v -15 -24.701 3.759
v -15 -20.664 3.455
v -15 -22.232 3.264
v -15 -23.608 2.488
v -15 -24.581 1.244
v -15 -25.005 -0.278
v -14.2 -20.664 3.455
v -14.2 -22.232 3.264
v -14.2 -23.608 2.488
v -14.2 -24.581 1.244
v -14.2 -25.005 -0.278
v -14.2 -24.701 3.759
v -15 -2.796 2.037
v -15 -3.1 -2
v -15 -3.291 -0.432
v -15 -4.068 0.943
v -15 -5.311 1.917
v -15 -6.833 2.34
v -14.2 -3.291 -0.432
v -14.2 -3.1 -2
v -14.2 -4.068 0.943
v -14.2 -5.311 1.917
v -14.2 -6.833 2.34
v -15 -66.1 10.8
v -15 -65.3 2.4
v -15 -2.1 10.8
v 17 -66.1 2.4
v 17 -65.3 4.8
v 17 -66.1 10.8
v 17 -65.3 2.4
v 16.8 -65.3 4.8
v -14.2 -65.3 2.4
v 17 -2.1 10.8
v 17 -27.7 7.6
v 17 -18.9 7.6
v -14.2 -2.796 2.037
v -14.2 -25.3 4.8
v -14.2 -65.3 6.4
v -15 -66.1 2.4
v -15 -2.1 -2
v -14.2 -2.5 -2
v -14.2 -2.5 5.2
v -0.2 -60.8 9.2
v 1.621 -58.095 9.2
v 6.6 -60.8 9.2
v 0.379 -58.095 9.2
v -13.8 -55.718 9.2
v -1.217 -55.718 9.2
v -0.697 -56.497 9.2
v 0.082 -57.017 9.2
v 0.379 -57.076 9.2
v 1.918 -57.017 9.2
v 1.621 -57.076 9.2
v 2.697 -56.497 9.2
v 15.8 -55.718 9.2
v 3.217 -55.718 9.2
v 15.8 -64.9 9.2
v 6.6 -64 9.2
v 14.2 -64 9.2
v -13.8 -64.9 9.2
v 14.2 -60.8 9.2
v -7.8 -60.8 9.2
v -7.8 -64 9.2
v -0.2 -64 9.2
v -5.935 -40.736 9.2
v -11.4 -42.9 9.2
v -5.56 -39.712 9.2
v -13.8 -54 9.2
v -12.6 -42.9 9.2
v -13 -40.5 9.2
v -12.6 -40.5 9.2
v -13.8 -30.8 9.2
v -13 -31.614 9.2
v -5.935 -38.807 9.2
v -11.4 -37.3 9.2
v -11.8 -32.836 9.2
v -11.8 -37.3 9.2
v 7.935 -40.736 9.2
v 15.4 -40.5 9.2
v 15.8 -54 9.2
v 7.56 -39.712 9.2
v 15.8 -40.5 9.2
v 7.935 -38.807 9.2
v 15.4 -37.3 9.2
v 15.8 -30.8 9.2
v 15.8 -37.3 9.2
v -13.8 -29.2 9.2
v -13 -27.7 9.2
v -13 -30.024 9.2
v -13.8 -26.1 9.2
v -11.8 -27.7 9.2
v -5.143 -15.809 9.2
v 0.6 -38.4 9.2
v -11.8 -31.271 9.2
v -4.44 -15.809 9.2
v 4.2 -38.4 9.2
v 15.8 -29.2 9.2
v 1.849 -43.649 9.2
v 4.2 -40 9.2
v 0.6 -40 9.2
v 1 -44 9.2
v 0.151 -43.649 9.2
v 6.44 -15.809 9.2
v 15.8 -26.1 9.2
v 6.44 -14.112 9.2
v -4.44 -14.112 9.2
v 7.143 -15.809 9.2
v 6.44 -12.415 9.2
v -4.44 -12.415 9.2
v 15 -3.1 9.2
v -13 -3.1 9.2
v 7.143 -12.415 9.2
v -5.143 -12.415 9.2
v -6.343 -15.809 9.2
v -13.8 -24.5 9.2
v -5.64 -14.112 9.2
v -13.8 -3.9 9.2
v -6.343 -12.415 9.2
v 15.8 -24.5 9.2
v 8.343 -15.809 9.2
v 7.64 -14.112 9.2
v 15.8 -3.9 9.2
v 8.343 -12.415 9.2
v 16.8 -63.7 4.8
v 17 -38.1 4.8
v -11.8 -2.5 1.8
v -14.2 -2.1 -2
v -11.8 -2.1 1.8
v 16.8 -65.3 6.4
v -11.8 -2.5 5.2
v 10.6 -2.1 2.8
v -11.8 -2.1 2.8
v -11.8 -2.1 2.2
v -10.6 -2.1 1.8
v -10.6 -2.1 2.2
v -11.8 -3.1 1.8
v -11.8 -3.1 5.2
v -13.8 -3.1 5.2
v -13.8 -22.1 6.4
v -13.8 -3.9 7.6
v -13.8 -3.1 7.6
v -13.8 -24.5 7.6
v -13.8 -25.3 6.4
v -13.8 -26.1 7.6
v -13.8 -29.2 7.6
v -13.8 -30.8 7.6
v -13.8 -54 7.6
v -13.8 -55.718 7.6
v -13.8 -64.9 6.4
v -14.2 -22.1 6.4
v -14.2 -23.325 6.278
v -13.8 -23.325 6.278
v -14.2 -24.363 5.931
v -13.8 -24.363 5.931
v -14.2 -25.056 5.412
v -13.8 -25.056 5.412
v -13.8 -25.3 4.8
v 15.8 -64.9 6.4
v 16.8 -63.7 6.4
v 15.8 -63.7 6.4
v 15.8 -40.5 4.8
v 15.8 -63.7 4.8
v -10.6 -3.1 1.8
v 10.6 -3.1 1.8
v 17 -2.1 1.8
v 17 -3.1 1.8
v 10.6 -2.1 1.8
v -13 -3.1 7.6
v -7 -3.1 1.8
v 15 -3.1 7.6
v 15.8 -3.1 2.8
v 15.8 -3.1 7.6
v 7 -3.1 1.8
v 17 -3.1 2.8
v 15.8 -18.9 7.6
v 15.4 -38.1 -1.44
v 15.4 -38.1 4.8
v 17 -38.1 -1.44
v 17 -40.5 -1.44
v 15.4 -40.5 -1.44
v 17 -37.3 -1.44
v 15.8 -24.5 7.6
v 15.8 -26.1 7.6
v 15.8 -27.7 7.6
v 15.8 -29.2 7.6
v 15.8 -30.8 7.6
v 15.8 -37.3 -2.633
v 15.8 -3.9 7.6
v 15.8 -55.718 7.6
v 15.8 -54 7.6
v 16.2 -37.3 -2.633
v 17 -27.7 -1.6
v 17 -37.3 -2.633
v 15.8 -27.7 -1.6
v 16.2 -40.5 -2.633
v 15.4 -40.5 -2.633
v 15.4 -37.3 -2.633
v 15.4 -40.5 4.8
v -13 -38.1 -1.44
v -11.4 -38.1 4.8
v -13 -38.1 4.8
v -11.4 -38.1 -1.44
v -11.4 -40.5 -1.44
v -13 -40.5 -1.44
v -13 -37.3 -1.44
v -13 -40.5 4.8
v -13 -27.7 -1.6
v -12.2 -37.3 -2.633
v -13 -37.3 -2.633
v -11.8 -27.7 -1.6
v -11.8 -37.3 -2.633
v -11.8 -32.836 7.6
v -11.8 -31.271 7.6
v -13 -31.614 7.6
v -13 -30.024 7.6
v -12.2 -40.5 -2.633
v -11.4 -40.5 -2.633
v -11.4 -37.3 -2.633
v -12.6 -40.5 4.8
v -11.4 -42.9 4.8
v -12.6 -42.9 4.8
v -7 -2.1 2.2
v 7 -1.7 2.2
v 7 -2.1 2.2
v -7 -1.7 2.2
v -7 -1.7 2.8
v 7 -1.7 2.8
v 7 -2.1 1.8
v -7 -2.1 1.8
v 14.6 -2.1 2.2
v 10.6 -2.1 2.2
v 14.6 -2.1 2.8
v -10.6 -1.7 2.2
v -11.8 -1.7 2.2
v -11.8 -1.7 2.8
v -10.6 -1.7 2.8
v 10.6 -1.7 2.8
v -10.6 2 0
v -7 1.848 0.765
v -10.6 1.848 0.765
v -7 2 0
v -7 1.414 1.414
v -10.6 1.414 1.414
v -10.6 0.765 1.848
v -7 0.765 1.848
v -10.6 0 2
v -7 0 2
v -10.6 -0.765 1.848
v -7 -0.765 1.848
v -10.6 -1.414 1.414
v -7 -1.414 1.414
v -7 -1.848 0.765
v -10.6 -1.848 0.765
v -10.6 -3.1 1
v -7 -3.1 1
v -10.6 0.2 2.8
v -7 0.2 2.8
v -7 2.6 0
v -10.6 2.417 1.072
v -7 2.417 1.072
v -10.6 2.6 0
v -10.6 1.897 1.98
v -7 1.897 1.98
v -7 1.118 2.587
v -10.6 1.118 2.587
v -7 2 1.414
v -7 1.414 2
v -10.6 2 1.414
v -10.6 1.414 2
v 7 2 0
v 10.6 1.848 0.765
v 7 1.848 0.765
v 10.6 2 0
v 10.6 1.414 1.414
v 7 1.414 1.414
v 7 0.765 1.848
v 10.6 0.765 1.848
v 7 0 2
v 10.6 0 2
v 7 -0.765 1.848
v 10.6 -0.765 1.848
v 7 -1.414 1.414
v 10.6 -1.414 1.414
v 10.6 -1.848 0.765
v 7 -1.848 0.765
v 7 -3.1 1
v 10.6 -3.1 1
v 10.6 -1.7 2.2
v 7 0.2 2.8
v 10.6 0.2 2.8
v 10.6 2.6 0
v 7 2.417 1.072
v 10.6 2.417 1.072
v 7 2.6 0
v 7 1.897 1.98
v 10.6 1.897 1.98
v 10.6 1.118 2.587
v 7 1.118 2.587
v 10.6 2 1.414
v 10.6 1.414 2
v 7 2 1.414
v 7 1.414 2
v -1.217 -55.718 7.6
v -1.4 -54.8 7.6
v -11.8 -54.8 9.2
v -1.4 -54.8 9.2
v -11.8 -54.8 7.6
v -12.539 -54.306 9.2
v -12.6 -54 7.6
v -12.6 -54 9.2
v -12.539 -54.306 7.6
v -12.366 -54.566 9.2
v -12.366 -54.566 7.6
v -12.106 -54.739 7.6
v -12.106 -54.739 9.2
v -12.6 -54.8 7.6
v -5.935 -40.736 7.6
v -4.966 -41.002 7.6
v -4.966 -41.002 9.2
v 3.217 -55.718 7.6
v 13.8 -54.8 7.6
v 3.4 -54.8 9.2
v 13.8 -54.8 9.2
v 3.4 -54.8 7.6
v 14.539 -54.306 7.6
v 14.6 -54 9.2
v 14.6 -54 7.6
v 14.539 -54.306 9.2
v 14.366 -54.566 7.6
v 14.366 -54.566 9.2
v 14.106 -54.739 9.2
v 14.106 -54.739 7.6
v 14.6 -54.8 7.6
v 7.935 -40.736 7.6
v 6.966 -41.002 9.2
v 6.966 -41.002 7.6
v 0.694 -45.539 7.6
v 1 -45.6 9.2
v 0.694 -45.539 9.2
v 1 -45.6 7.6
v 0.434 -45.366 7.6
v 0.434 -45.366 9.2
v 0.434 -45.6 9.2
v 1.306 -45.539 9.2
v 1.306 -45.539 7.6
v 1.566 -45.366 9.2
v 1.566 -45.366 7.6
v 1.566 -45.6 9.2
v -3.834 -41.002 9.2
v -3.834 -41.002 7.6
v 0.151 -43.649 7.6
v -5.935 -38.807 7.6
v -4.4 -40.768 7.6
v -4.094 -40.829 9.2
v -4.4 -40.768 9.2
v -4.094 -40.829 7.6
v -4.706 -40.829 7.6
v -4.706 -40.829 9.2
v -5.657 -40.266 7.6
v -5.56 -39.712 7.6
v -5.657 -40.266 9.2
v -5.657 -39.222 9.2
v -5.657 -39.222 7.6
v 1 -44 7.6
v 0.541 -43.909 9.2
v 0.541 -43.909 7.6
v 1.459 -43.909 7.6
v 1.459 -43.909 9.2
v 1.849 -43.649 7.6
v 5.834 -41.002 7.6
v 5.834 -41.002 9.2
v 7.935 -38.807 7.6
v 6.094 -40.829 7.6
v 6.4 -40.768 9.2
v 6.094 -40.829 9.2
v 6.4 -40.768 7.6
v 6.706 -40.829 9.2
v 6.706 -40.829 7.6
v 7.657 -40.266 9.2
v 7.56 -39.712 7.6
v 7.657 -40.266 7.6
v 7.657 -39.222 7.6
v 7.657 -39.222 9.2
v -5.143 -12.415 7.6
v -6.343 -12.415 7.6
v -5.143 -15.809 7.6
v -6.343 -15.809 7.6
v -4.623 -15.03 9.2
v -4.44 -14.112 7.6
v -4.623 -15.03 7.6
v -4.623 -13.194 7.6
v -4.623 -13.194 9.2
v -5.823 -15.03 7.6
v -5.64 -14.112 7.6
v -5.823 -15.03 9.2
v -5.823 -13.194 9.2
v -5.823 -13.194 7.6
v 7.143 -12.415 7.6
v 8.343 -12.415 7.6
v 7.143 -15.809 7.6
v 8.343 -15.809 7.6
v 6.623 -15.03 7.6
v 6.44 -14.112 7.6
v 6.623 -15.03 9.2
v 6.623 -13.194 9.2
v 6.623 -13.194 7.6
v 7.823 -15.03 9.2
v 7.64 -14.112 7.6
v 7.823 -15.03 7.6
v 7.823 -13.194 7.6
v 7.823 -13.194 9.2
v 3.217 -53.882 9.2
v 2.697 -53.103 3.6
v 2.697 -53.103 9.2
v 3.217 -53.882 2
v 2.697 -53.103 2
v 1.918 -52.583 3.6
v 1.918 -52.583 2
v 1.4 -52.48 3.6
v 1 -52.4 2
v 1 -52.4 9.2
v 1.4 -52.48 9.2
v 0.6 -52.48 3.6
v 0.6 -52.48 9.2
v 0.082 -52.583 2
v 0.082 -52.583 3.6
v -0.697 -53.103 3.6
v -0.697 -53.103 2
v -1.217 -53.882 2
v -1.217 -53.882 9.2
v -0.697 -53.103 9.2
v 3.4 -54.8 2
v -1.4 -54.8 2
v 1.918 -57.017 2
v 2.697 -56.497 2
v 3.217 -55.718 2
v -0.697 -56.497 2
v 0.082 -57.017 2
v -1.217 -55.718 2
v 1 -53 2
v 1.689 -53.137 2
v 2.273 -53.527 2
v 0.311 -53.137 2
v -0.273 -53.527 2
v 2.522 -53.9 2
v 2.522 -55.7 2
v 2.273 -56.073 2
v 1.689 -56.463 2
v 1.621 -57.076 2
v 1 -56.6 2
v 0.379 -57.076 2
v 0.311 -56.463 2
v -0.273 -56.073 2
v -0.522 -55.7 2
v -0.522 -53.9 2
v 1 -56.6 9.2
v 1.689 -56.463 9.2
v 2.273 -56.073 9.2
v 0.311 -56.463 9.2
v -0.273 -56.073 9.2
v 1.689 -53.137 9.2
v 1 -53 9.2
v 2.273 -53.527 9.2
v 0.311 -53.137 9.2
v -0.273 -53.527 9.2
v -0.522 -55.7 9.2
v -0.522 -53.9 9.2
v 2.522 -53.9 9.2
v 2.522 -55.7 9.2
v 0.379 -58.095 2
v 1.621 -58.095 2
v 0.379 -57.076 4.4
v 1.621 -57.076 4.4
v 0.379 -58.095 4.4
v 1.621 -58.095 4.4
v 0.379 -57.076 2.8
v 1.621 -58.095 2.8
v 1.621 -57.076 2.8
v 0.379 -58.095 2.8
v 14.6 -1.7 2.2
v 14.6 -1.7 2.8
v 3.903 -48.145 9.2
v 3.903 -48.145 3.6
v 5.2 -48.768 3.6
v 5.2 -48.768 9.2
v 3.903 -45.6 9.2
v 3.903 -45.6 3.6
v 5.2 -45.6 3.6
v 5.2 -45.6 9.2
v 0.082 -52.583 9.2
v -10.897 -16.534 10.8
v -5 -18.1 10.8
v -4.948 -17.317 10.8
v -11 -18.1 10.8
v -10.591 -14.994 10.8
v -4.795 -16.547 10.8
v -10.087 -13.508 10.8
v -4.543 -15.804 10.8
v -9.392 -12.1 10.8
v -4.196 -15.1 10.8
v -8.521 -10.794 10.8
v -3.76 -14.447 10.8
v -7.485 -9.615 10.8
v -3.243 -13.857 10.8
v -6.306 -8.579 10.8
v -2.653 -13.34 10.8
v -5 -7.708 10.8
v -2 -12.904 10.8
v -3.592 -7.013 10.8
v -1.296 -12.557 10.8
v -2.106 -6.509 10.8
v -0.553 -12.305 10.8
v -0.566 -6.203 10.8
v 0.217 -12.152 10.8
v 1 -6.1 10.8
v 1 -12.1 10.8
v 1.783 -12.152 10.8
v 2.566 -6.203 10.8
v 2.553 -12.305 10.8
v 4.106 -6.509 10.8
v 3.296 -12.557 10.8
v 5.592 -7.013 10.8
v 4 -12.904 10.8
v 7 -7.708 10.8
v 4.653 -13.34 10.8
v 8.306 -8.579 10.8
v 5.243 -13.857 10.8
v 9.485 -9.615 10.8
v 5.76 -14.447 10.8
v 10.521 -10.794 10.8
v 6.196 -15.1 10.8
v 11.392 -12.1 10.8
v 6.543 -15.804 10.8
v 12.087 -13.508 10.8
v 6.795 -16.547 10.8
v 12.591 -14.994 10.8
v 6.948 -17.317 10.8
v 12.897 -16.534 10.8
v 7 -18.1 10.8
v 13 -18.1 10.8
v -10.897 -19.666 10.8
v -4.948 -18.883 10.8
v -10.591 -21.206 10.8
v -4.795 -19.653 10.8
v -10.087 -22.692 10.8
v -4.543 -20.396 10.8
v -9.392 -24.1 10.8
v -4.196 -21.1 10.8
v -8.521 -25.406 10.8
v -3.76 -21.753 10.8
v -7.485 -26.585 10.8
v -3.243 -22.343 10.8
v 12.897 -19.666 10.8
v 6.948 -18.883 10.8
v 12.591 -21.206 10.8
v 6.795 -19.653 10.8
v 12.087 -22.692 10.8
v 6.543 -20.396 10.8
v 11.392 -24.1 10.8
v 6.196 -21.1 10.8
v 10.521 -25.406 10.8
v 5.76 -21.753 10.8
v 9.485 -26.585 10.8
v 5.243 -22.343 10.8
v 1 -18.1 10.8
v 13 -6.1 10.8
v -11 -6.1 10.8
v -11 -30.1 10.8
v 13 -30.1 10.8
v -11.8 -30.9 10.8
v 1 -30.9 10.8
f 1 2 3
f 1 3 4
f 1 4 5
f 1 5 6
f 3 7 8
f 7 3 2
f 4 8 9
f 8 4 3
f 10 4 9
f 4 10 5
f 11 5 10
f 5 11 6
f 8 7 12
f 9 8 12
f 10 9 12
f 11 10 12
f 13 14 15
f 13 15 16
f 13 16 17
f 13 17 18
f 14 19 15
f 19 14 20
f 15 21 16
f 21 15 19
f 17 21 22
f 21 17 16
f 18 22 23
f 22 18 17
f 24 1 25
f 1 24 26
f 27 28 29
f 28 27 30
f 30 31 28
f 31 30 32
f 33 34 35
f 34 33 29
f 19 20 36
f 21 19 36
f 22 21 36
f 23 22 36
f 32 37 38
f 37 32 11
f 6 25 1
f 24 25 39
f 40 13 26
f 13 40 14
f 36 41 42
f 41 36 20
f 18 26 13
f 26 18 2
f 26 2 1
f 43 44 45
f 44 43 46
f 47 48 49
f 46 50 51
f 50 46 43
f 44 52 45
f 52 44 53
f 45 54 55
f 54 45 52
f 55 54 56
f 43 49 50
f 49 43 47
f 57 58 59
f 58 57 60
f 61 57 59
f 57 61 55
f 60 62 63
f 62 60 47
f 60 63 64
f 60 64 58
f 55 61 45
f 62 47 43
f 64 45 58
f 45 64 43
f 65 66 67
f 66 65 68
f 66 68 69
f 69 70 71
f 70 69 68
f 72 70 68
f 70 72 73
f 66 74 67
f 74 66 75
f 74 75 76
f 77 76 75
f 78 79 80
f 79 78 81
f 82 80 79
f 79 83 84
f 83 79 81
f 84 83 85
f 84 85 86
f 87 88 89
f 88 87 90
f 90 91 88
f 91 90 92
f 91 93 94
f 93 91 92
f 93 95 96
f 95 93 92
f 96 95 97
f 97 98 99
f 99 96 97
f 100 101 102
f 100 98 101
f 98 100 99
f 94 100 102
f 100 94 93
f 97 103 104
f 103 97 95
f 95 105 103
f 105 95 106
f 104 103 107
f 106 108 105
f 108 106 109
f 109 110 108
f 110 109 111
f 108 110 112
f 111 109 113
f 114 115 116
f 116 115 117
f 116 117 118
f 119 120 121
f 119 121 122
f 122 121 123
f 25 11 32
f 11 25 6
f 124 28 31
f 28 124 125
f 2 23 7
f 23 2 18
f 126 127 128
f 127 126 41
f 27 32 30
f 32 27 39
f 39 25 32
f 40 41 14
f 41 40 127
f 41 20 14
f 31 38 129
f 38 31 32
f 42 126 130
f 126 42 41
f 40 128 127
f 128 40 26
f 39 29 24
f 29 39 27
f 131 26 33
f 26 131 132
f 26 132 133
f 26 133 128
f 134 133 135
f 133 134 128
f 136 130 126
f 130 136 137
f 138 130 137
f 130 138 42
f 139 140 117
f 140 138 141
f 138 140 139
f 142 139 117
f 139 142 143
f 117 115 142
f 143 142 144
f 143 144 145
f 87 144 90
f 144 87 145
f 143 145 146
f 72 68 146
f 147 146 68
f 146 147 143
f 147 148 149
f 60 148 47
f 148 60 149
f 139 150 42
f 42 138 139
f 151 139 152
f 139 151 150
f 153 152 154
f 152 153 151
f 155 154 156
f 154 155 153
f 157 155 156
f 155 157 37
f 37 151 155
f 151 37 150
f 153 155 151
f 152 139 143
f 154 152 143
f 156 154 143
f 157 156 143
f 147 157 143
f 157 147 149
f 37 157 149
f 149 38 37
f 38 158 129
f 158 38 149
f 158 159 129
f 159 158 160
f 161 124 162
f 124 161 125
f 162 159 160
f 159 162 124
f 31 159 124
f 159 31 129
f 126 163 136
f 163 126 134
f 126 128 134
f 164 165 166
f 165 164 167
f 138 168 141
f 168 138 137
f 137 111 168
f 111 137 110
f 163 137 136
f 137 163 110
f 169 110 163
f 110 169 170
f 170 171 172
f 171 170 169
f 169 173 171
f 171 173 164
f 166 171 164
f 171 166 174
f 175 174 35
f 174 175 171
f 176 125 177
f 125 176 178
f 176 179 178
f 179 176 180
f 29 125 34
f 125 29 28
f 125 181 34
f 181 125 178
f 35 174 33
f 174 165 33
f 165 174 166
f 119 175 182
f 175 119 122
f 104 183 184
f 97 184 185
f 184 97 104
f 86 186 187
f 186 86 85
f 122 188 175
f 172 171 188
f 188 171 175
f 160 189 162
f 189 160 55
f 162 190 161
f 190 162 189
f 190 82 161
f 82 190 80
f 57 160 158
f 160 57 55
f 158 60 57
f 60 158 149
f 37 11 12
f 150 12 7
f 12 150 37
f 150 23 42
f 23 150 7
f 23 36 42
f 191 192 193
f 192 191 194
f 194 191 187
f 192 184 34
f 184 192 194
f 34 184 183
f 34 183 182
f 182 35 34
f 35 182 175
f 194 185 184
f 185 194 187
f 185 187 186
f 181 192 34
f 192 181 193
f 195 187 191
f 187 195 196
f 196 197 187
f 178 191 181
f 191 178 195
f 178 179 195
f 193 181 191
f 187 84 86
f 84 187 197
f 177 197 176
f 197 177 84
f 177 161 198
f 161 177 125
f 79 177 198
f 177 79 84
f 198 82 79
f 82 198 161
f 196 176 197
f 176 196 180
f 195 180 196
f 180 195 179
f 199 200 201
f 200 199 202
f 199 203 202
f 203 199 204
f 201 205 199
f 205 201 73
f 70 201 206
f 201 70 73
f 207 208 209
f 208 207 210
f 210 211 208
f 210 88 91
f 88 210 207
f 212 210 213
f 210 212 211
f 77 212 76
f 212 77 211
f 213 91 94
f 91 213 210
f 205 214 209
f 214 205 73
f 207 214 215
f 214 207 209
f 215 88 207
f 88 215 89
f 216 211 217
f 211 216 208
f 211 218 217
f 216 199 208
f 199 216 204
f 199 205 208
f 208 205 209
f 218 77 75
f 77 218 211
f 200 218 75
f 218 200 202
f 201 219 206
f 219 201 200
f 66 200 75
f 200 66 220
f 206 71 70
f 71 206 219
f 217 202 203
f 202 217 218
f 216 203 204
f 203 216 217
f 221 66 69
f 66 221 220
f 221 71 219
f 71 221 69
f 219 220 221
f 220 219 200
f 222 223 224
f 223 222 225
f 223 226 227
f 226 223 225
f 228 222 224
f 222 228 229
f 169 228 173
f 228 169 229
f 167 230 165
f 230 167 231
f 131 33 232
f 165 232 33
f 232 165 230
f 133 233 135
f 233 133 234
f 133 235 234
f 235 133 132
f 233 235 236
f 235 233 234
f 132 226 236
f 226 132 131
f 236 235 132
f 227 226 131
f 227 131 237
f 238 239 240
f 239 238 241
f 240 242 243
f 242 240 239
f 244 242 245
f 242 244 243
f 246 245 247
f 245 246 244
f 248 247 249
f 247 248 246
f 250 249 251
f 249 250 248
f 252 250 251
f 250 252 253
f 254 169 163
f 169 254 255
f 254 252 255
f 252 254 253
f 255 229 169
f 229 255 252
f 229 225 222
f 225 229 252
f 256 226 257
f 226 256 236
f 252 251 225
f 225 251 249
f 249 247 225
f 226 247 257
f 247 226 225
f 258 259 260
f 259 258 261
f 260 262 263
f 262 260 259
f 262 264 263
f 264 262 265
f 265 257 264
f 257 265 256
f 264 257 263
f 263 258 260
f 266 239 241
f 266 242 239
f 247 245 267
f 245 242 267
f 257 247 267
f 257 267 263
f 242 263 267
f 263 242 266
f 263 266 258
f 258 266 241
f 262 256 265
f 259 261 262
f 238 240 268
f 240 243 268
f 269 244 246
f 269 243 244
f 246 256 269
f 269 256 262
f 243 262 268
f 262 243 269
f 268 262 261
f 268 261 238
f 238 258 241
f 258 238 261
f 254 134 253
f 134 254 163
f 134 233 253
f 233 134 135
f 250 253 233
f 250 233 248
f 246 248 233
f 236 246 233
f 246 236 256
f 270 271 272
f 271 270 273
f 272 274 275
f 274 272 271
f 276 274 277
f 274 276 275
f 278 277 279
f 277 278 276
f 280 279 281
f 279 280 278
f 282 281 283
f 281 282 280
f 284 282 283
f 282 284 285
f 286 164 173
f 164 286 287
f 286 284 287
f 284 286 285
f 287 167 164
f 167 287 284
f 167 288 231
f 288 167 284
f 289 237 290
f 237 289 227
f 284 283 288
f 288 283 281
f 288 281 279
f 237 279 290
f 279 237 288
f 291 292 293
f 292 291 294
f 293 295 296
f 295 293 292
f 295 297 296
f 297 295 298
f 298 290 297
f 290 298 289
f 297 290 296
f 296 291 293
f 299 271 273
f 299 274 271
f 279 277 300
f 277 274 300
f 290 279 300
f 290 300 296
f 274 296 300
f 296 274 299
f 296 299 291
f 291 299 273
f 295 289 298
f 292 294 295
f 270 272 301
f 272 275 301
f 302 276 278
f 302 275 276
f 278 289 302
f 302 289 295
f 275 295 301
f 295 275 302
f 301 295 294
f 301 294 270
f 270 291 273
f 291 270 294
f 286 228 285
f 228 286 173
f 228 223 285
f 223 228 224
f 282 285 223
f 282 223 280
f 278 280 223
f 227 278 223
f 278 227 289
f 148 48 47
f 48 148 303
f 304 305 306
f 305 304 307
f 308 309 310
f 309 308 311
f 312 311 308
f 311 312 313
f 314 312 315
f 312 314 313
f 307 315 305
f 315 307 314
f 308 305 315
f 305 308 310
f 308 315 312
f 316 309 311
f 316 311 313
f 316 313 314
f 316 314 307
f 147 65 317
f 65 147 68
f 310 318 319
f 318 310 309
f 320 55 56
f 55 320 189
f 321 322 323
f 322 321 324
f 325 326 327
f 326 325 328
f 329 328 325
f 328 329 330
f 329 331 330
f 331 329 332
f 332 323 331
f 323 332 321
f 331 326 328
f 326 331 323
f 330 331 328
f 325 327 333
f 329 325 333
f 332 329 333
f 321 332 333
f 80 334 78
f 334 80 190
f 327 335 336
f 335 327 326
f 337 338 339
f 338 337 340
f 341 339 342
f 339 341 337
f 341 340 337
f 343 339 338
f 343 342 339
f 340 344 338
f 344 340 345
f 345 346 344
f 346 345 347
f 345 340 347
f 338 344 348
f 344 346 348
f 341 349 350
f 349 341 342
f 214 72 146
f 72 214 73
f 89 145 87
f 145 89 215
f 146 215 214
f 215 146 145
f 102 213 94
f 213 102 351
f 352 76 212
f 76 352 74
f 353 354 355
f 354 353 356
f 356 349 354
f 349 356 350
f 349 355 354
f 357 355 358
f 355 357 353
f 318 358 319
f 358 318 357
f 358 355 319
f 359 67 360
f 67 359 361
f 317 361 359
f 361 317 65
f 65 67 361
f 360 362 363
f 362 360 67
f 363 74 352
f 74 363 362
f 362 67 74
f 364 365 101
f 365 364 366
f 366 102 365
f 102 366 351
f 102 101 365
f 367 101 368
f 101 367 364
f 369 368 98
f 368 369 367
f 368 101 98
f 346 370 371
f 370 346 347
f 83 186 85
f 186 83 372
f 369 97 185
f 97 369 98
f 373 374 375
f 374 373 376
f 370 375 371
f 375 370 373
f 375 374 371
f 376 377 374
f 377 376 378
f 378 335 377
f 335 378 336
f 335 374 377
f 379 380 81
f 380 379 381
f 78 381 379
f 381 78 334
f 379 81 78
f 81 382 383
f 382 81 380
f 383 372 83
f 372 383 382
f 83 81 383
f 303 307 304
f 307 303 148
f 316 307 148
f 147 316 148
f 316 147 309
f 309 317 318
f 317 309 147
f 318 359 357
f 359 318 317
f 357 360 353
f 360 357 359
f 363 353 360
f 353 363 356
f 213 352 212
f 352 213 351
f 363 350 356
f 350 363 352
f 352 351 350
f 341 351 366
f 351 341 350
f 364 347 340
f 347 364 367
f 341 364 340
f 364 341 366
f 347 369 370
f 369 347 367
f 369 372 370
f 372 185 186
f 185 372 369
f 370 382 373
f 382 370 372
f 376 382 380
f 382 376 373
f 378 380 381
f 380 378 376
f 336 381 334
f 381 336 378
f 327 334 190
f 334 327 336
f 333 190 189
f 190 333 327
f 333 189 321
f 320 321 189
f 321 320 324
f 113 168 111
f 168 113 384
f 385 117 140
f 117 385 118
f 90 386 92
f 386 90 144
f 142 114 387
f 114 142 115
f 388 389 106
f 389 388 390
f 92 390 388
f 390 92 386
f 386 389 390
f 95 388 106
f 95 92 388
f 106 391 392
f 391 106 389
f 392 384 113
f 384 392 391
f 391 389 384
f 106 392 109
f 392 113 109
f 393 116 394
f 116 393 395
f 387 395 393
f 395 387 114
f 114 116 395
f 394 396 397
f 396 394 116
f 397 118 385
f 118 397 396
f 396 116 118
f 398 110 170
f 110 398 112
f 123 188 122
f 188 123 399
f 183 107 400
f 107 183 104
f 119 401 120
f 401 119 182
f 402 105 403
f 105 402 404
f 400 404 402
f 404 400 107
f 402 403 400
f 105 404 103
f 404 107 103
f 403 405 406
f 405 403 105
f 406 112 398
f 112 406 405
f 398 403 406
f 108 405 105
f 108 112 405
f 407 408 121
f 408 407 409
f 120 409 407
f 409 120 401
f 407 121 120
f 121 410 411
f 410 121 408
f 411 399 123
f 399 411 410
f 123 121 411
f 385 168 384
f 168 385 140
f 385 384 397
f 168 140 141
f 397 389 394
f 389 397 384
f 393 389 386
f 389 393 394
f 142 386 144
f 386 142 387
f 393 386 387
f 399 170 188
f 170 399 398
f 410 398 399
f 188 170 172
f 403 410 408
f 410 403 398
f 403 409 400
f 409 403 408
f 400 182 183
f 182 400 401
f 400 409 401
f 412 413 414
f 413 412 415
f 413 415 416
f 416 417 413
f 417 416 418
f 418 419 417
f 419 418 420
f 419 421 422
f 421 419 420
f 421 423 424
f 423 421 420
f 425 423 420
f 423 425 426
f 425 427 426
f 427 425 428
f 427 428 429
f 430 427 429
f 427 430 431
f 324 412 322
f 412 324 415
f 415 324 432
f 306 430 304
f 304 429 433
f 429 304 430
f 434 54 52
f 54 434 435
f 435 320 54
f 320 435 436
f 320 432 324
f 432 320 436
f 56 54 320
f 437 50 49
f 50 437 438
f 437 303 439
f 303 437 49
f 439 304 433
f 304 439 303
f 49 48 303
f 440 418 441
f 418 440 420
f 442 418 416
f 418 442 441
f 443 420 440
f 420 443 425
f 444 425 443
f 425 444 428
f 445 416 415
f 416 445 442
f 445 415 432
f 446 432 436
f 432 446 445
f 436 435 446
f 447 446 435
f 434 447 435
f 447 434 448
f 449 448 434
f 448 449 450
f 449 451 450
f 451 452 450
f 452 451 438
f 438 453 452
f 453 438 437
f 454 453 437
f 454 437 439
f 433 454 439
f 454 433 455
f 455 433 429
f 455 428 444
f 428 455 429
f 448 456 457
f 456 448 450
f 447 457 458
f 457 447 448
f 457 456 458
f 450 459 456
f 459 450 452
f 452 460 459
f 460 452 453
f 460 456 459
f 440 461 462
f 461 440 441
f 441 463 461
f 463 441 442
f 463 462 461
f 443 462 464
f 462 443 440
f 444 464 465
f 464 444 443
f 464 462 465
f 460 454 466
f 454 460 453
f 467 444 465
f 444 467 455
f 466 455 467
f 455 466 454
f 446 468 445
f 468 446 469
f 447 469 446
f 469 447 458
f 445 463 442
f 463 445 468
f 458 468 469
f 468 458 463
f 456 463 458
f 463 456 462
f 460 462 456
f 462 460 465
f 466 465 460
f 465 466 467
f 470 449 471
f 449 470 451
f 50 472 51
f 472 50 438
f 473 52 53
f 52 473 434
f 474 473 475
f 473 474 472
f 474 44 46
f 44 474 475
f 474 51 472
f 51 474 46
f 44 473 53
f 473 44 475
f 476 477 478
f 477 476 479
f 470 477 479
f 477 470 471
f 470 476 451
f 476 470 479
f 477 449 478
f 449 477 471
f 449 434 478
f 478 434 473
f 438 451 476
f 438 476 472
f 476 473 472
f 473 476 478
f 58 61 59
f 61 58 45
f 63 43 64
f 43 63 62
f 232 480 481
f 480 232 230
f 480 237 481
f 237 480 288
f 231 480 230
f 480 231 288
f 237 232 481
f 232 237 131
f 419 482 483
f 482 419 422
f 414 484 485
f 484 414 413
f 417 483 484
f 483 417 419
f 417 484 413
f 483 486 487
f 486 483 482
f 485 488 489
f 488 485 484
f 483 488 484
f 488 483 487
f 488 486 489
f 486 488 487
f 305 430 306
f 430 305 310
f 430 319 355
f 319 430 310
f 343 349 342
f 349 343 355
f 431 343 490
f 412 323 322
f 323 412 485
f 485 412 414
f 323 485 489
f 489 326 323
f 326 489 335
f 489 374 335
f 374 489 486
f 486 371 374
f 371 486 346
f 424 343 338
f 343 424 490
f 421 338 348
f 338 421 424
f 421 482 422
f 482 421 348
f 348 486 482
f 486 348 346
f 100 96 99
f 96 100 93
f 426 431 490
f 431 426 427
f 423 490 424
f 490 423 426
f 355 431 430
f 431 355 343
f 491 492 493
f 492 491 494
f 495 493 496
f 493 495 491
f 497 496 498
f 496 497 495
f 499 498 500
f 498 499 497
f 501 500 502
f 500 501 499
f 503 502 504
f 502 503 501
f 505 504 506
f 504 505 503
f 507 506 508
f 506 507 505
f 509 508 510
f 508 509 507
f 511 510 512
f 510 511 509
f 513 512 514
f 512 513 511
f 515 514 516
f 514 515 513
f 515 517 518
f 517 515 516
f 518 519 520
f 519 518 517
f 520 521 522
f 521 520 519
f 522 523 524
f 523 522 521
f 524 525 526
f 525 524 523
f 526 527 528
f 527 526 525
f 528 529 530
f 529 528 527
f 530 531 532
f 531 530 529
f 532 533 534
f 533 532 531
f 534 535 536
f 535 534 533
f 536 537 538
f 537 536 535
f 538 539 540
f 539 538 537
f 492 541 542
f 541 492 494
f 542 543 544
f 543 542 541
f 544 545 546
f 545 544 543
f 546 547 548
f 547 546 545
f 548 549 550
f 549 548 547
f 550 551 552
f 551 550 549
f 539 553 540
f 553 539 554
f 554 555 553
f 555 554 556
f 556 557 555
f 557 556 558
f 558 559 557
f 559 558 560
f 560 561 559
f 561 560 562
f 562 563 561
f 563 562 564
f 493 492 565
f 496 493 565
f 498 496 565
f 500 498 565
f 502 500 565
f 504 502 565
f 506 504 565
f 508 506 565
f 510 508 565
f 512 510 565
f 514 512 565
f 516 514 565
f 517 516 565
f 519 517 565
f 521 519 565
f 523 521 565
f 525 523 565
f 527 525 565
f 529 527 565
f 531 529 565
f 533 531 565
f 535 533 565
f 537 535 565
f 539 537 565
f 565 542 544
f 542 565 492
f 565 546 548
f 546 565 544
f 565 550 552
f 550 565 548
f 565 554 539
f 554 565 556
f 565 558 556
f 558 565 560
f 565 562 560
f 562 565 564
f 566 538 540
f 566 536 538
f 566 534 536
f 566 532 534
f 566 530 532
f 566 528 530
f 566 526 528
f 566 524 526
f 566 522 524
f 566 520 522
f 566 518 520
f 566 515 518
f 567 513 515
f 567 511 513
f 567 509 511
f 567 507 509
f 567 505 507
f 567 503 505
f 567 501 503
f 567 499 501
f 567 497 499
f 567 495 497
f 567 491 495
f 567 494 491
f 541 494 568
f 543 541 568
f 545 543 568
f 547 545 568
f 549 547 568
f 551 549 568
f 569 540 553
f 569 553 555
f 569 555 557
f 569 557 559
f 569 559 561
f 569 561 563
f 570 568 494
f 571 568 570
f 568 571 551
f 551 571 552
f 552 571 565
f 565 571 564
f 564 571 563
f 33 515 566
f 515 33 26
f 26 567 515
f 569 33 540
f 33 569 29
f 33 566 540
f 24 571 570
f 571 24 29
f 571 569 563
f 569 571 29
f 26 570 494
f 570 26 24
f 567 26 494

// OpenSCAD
use <../lib.scad>
use <s/4112p05s01.scad>
use <s/4112s01.scad>
use <s/4112s03.scad>
function ldraw_lib__4112p05() = [
// 0 ~Electric Switch: Key Left with Left Rotating Arrow Pattern
// 0 Name: 4112p05.dat
// 0 Author: Javier Orquera [kuramapika1]
// 0 !LDRAW_ORG Part UPDATE 2025-09
// 0 !LICENSE Licensed under CC BY 4.0 : see CAreadme.txt
// 
// 0 !HELP to put this part into a pressed-down state, rotate it 4.3 degrees
// 0 !HELP around the x-axis
// 
// 0 BFC CERTIFY CCW
  [0,"BFC","CERTIFY"],
  [0,"BFC","CCW"],
// 
// 0 !KEYWORDS control, dacta, set 1039, set 1342, Technic
// 
// 0 !HISTORY 2025-04-24 [kuramapika1] Adapted surfaces
// 0 !HISTORY 2025-09-11 [kuramapika1] Use of new subfile
// 0 !HISTORY 2025-09-29 [OrionP] Official Update 2025-09
// 
// 1 16 0 0 0 1 0 0 0 1 0 0 0 1 s\4112s01.dat
  [1,16,0,0,0,1,0,0,0,1,0,0,0,1, ldraw_lib__s__4112s01()],
// 1 16 0 0 0 1 0 0 0 1 0 0 0 1 s\4112s03.dat
  [1,16,0,0,0,1,0,0,0,1,0,0,0,1, ldraw_lib__s__4112s03()],
// 1 16 2.5 -5 0 1 0 0 0 1 0 0 0 1 s\4112p05s01.dat
  [1,16,2.5,-5,0,1,0,0,0,1,0,0,0,1, ldraw_lib__s__4112p05s01()],
];
module ldraw_lib__4112p05(step=0, col=false, unit=2/5, alt=false, line=0.2, solid=!$preview)
    makepoly(ldraw_lib__4112p05(), step=step, col=col, unit=unit, alt=alt, line=line, solid=solid);
ldraw_lib__4112p05(line=0.2);
